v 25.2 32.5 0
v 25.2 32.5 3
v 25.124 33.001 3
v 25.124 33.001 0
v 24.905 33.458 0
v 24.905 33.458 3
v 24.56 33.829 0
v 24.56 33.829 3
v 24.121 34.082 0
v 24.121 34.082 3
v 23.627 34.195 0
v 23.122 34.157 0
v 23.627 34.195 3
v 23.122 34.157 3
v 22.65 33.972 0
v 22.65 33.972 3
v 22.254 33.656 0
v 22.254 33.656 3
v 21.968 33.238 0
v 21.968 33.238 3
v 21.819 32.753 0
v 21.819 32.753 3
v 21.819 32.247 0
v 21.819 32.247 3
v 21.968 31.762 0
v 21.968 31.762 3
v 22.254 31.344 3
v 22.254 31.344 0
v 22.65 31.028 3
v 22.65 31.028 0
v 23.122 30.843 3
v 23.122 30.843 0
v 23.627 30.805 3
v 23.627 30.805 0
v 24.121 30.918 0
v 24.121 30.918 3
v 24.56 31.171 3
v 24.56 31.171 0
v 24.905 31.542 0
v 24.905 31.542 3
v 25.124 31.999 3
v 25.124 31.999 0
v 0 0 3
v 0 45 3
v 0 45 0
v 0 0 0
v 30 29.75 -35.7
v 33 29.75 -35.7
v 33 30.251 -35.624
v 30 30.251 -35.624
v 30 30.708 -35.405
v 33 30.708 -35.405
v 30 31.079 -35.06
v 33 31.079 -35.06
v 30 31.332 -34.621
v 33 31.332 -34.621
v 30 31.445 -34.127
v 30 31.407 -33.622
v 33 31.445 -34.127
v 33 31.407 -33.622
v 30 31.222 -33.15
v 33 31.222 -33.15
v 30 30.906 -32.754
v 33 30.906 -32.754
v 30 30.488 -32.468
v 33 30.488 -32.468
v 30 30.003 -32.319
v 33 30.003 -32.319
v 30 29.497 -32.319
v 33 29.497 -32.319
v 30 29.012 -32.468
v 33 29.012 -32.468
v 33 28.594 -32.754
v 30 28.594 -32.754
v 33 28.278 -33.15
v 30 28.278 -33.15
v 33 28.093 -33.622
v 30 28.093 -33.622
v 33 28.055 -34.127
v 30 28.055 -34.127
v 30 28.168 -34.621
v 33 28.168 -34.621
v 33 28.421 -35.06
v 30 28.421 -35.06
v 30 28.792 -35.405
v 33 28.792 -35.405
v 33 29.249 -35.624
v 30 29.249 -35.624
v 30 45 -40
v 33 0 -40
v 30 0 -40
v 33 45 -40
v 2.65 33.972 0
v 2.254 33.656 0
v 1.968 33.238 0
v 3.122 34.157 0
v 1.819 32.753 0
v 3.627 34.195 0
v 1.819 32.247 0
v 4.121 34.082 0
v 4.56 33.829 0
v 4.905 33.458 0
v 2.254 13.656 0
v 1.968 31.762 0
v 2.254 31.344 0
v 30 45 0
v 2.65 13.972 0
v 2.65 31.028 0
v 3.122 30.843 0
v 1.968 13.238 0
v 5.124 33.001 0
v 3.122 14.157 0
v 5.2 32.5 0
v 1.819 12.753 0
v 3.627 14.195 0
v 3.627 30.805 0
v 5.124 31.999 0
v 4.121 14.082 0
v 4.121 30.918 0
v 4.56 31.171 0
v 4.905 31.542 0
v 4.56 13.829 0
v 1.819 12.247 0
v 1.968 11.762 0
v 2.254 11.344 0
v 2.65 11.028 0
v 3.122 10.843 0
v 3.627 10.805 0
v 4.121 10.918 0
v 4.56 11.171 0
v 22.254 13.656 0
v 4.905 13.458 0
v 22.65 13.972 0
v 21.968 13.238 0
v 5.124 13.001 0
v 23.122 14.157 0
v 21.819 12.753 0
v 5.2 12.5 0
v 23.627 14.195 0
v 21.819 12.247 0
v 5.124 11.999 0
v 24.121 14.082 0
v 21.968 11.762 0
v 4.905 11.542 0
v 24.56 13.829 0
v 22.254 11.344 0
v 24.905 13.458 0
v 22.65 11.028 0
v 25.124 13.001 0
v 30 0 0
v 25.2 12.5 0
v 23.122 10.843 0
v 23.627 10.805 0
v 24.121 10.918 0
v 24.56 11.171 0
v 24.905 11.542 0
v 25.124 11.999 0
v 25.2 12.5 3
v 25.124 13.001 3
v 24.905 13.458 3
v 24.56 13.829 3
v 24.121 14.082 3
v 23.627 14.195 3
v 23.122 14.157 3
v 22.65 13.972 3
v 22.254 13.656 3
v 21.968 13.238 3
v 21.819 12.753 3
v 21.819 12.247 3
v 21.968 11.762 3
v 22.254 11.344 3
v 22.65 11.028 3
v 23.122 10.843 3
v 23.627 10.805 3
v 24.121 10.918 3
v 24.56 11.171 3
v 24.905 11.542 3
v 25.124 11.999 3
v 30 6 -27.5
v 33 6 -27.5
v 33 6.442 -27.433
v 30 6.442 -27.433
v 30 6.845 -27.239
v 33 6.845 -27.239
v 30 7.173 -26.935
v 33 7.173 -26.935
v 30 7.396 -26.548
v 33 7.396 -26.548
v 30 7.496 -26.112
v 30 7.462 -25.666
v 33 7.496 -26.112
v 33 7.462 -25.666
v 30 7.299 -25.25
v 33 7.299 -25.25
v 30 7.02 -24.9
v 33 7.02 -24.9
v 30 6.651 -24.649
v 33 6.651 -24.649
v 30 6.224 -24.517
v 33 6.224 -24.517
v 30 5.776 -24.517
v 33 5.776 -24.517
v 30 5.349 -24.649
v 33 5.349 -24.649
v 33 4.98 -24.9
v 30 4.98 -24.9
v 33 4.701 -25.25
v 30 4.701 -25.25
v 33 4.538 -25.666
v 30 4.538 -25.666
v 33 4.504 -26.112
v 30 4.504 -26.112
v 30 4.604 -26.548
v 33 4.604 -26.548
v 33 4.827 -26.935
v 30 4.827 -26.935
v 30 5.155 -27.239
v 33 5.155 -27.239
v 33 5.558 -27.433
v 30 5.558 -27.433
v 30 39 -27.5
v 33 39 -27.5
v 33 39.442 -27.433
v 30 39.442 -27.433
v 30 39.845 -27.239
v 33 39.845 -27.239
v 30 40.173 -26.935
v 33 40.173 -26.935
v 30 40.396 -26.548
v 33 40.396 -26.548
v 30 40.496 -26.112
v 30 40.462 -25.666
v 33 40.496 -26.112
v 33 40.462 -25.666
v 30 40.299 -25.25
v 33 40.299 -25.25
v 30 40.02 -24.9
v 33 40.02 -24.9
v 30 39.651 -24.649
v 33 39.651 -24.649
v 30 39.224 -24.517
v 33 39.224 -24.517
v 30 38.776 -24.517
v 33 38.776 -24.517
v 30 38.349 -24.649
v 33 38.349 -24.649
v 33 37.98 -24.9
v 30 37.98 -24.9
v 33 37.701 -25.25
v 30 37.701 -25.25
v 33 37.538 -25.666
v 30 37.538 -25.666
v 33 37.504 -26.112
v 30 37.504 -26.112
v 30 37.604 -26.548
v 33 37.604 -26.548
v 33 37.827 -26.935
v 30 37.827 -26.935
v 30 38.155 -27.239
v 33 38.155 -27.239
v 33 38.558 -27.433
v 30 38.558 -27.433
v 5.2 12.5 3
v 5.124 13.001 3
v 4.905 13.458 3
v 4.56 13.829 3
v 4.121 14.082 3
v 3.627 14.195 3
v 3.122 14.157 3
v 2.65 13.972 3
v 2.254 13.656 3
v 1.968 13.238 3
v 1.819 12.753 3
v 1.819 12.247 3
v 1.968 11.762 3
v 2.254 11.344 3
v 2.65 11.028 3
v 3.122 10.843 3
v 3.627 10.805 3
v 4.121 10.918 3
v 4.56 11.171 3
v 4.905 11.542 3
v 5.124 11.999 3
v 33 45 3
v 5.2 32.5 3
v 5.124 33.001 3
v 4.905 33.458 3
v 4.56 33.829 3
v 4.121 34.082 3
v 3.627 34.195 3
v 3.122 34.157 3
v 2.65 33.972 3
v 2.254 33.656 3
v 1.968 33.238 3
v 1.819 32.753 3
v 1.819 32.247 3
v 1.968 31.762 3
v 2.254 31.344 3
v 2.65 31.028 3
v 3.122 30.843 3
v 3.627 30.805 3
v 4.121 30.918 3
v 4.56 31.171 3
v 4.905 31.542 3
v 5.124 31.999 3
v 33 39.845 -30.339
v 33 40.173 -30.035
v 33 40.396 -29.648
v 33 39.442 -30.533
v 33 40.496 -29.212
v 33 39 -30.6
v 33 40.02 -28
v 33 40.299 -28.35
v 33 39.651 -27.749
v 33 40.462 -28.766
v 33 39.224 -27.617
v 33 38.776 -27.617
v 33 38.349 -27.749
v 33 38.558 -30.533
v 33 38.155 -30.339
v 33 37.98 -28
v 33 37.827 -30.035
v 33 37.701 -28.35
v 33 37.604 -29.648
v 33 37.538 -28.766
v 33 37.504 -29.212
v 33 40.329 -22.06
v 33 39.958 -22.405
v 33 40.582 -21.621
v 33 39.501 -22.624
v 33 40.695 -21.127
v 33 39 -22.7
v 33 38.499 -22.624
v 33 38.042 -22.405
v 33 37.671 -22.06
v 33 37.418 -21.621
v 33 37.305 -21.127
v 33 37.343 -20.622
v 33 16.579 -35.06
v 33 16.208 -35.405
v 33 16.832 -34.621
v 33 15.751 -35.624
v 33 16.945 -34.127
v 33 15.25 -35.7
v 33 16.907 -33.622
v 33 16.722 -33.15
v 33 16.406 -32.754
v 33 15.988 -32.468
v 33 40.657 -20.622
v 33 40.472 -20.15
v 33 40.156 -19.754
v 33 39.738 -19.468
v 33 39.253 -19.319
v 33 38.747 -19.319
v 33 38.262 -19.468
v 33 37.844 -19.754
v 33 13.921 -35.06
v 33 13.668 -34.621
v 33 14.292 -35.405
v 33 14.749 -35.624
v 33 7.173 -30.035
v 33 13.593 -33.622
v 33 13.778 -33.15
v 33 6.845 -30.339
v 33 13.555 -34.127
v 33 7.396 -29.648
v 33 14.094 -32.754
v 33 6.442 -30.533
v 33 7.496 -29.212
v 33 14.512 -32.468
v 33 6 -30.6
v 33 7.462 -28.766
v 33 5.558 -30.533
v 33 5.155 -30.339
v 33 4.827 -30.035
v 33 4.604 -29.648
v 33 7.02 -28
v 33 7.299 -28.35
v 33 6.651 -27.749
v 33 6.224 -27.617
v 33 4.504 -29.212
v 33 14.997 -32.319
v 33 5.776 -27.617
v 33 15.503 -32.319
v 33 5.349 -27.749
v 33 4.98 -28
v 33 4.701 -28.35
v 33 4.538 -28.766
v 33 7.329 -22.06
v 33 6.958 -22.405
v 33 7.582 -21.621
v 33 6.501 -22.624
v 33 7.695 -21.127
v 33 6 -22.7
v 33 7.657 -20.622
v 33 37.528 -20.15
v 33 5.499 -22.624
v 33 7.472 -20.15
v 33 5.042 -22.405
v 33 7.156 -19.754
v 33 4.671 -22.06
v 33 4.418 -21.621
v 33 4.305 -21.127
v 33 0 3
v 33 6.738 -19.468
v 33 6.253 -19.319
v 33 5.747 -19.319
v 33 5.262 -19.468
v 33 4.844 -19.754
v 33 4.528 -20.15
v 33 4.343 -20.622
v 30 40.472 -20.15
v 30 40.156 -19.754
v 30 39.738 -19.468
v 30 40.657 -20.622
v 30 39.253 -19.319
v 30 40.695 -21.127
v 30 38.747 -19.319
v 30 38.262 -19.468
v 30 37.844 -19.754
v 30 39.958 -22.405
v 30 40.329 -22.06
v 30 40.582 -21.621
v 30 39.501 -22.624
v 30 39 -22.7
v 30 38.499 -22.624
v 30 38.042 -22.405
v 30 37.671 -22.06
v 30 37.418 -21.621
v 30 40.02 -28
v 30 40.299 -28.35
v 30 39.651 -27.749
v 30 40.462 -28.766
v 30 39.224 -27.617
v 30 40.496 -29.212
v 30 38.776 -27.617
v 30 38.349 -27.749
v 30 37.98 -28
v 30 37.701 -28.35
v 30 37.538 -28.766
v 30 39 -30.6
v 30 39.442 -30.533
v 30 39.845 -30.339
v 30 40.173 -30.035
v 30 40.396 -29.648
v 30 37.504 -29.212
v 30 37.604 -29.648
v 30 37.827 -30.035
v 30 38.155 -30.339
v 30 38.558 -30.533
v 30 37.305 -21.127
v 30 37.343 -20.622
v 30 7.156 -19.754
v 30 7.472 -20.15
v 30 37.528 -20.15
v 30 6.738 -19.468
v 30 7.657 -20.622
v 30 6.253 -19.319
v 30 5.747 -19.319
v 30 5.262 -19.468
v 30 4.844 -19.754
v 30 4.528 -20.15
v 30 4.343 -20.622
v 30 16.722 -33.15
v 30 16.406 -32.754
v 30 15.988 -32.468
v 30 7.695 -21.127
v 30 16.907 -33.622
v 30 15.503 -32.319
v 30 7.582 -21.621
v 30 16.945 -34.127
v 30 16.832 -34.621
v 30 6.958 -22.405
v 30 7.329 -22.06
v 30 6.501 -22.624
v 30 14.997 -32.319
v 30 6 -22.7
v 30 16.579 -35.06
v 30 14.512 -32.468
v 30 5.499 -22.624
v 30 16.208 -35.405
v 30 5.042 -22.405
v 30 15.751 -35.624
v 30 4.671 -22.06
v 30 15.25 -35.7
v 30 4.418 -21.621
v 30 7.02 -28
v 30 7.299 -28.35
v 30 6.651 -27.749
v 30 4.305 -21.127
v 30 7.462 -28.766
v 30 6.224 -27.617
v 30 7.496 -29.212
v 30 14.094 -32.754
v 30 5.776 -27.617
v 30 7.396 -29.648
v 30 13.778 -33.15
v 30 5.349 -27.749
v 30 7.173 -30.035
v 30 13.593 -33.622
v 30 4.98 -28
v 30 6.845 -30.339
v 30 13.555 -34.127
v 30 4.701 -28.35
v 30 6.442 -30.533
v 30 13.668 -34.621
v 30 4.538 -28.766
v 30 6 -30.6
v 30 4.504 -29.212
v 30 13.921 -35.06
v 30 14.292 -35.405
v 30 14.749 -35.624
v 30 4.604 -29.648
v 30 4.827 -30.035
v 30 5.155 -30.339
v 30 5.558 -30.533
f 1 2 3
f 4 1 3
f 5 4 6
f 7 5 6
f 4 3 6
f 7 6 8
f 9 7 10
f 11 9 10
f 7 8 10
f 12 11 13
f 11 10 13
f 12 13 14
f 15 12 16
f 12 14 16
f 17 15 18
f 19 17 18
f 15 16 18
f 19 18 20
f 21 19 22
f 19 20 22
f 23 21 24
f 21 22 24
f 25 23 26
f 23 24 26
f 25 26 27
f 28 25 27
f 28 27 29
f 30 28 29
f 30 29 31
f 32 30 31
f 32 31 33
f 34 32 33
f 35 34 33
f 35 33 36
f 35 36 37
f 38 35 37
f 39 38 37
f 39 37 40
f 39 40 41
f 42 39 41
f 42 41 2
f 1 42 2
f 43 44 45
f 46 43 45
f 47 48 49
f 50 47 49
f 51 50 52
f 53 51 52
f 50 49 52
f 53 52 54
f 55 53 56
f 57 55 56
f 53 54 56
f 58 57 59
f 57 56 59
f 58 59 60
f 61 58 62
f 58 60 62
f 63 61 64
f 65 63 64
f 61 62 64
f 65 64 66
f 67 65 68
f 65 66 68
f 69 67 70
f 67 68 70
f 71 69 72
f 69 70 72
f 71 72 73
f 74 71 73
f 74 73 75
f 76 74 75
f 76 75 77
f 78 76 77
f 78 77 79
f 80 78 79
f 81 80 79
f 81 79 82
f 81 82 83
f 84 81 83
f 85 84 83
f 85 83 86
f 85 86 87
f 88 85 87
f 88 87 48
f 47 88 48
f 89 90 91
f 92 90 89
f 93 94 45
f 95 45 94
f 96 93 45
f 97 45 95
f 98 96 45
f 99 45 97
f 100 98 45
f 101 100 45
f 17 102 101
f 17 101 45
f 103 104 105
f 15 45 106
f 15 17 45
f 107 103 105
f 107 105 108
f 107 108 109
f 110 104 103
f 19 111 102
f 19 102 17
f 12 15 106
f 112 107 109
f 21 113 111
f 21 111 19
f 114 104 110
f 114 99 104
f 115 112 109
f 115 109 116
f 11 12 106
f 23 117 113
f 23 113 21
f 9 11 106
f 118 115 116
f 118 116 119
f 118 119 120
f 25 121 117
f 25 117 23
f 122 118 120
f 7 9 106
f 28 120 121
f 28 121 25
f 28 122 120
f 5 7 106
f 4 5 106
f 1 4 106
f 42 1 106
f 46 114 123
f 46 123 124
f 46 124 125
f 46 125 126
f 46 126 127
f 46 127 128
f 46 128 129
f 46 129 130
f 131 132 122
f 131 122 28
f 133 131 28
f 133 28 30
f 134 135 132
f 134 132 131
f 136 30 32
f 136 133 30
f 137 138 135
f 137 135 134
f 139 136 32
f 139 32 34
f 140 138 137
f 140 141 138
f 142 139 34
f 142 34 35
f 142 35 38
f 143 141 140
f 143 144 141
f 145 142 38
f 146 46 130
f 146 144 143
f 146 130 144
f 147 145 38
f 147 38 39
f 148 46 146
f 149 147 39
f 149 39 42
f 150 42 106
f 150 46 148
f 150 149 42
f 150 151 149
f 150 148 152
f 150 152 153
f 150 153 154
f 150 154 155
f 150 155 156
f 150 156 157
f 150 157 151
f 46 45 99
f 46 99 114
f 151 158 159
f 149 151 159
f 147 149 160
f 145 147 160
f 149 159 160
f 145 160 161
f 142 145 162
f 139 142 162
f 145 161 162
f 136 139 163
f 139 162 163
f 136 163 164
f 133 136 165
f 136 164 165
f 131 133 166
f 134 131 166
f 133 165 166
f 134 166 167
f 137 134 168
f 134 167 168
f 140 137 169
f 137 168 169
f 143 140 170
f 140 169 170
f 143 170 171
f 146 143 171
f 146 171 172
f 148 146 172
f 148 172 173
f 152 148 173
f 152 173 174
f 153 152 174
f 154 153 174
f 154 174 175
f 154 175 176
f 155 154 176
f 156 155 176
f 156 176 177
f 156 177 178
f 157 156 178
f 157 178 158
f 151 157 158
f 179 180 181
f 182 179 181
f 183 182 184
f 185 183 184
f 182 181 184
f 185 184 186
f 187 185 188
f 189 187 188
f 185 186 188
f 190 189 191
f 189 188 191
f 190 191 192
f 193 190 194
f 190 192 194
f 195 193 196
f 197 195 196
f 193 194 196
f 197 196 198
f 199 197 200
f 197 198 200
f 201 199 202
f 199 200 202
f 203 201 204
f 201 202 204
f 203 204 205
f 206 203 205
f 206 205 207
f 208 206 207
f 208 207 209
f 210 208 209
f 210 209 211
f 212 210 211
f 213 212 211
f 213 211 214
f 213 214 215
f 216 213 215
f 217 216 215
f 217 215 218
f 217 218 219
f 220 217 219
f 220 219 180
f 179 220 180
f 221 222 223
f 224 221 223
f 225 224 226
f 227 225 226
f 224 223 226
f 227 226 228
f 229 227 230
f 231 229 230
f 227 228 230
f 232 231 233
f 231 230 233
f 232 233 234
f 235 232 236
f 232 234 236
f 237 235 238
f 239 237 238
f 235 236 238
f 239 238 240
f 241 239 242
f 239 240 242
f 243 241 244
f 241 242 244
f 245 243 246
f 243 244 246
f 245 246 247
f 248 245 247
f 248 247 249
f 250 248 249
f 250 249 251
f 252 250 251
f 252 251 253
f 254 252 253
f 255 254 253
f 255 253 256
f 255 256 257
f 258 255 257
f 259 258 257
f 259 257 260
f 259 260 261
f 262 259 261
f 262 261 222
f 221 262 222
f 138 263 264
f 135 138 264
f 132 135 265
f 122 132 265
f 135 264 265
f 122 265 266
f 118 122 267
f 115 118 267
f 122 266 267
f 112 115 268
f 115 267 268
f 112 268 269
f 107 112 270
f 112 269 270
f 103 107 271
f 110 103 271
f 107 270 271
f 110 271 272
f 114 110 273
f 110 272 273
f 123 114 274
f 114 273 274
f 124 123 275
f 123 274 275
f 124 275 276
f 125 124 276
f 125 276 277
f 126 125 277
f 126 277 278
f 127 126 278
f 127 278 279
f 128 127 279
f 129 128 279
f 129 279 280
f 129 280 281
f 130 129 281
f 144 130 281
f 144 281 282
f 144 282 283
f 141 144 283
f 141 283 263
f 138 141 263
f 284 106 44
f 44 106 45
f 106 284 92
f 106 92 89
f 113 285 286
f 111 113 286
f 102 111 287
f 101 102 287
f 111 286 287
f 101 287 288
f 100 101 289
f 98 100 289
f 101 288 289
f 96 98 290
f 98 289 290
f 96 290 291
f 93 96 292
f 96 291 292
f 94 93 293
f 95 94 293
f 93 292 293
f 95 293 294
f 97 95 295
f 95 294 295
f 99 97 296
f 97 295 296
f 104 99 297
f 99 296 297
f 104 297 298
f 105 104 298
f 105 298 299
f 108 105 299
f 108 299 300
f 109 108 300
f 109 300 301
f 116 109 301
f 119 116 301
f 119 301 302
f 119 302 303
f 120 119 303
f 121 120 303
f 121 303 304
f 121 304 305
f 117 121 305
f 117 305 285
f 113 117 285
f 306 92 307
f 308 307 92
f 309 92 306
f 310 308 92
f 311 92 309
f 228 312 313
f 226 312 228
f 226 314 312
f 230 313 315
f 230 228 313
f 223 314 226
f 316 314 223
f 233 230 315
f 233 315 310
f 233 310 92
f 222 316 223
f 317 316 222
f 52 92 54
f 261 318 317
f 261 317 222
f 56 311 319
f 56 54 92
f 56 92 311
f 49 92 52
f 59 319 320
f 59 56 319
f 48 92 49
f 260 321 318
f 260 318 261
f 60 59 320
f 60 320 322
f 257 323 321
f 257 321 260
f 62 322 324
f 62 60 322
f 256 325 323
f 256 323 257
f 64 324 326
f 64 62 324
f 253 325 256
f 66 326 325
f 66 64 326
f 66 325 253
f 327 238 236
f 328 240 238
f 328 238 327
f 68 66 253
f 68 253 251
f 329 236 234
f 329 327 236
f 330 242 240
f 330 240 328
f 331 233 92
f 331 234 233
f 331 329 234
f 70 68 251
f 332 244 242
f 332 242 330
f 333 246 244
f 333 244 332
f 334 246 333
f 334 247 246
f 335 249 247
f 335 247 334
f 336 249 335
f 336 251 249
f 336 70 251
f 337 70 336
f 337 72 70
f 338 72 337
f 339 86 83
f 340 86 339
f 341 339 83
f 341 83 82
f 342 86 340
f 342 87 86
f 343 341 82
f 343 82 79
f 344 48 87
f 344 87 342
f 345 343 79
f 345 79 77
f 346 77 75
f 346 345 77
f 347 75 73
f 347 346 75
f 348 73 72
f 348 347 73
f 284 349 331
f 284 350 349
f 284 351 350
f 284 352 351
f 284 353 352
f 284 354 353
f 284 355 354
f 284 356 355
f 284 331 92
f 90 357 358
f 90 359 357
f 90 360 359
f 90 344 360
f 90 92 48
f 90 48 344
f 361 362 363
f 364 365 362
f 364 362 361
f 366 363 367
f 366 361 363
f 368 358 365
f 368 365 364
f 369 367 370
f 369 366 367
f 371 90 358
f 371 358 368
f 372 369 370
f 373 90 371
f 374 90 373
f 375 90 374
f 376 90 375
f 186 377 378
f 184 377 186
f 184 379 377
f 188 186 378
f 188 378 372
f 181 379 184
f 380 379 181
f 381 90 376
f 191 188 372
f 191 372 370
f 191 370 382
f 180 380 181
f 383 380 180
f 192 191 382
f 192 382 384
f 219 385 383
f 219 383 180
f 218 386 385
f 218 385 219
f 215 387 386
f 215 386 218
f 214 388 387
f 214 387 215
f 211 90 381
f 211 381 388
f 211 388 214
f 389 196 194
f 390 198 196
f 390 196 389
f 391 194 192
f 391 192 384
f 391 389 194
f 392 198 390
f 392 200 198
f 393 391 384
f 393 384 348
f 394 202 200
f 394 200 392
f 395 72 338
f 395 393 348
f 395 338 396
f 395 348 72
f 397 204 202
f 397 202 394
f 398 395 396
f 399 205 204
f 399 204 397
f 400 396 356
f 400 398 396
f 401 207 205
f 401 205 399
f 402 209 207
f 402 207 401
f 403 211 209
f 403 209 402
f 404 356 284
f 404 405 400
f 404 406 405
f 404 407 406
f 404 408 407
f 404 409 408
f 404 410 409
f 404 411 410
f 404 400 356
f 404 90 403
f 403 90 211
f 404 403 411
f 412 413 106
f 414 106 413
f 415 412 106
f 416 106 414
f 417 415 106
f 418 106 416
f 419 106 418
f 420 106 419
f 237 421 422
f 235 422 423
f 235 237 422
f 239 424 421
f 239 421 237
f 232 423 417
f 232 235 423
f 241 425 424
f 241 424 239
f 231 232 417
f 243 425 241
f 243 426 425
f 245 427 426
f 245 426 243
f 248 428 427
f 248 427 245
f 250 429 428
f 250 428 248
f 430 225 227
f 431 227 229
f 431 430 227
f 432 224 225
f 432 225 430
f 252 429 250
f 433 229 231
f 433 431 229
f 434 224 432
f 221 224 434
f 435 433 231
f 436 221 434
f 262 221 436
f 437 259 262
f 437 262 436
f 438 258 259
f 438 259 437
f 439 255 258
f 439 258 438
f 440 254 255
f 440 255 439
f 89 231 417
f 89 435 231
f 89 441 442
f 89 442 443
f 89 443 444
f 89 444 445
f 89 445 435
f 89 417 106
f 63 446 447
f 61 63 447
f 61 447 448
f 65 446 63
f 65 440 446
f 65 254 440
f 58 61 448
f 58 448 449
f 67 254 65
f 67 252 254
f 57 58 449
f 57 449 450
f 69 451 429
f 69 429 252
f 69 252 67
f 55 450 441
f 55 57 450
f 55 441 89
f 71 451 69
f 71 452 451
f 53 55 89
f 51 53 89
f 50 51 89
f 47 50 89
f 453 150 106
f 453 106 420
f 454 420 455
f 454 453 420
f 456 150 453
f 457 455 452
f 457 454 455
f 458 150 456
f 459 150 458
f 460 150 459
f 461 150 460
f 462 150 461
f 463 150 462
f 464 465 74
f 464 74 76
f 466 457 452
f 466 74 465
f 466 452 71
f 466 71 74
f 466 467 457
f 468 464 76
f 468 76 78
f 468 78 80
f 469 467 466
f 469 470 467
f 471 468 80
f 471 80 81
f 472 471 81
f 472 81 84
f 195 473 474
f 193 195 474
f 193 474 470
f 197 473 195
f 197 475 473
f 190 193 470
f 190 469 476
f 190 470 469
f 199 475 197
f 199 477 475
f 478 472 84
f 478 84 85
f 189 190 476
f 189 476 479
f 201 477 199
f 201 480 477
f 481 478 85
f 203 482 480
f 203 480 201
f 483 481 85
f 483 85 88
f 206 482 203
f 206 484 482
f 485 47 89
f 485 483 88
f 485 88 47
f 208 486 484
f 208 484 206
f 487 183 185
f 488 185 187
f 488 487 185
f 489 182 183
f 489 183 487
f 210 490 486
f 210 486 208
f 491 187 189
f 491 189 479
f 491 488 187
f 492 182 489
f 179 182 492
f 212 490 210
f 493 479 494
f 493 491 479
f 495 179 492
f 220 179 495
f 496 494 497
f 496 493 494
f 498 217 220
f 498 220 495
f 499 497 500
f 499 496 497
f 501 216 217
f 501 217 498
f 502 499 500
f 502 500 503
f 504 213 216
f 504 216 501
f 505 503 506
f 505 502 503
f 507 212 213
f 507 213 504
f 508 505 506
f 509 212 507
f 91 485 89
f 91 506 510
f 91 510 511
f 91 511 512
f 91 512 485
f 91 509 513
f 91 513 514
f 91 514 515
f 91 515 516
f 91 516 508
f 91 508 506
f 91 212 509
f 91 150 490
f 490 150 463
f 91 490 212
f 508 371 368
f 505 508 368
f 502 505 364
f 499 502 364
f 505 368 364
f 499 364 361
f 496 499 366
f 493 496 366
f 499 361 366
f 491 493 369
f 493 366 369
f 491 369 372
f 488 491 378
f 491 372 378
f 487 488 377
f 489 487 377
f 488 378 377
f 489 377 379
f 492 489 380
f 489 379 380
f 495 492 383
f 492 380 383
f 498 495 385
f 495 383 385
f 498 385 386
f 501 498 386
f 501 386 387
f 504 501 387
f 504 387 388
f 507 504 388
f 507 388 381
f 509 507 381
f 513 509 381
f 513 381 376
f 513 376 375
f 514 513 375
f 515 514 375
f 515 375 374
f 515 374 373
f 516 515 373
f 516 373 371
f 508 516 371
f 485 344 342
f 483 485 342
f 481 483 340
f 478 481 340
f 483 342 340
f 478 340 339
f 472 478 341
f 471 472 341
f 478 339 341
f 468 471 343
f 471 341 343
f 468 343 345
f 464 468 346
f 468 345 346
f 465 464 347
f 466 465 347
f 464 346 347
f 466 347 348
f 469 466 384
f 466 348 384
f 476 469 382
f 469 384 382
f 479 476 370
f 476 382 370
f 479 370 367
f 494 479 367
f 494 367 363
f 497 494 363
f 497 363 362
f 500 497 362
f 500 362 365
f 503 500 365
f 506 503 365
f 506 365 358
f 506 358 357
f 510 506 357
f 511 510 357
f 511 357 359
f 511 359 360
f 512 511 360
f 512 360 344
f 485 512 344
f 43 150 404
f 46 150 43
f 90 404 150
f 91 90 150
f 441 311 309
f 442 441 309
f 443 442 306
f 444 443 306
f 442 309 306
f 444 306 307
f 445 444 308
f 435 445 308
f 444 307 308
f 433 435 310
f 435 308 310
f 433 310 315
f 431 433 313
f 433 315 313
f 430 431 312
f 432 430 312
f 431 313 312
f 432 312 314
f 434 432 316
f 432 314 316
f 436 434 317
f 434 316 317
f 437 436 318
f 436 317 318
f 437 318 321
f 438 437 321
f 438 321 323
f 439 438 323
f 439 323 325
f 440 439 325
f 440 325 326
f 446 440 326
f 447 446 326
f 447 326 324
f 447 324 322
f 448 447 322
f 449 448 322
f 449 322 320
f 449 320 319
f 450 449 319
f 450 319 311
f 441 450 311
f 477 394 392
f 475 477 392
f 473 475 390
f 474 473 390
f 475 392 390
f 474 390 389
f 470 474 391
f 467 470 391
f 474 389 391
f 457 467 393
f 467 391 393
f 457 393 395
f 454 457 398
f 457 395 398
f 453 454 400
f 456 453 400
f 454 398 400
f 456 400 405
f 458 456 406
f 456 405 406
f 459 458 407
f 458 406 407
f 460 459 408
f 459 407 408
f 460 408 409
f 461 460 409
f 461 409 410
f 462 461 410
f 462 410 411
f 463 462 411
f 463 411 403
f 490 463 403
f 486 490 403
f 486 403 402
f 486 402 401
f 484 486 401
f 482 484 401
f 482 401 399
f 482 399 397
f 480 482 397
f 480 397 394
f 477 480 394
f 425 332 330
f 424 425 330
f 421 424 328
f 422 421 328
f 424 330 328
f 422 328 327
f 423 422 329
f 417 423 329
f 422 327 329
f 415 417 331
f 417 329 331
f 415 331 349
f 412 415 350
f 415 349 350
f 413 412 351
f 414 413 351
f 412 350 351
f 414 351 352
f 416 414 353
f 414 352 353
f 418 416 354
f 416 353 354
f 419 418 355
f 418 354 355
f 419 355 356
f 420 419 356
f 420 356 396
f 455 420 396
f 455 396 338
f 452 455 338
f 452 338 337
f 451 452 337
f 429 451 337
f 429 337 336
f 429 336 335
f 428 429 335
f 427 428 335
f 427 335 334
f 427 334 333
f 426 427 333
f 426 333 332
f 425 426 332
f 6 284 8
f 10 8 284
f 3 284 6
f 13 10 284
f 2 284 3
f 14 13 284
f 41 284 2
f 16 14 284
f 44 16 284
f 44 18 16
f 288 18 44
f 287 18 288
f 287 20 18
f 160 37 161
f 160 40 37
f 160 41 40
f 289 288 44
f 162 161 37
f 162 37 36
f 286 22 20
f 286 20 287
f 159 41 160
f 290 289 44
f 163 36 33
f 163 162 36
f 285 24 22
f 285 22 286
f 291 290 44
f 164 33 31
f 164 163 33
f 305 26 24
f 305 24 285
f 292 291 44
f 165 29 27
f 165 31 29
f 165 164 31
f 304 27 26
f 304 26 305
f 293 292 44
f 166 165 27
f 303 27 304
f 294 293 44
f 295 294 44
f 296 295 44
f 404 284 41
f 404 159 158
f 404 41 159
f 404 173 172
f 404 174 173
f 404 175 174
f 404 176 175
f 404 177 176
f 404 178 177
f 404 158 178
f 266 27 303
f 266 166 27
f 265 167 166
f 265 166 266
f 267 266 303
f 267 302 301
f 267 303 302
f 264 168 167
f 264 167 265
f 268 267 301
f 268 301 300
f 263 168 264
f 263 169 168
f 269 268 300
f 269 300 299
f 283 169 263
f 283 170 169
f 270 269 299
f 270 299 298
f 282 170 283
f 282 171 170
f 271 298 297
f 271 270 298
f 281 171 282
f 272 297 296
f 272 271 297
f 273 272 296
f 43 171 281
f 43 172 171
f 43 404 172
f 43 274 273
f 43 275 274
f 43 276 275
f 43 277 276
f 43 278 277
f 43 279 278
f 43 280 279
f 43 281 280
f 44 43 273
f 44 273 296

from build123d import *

# Parameters (mm, degrees)
EXTRUDE_1_DEPTH          = 45
CUT_EXTRUDE_1_REACH      = 86.161
SKETCH_2_R               = 1.7
CUT_EXTRUDE_2_REACH      = 83.939
SKETCH_3_R               = 1.7
SKETCH_3_R_2             = 1.5
CUT_EXTRUDE_3_DEPTH      = 81.777472107
CUT_EXTRUDE_3_DEPTH_BACK = 81.777472107


with BuildPart() as part:
    # 草图1 → 凸台-拉伸1 (new body)
    with BuildSketch(Plane(origin=(0, 0, 0), x_dir=(1, 0, 0), z_dir=(0, 1, 0))):
        Polygon((0, 0), (30, 0), (30, 60), (33, 60), (33, -3), (0, -3), align=None)
    extrude(amount=EXTRUDE_1_DEPTH)

    # 草图2 → 切除-拉伸1 (cut, up to next)
    with BuildSketch(Plane.XY.offset(3), mode=Mode.PRIVATE) as cut_extrude_1_sk1:
        with Locations((3.5, 32.5)):
            Circle(SKETCH_2_R)
    cut_extrude_1_tool1 = extrude(cut_extrude_1_sk1.sketch, amount=-CUT_EXTRUDE_1_REACH, mode=Mode.PRIVATE) & part.part
    # 草图2 → 切除-拉伸1 (cut, up to next)
    with BuildSketch(Plane.XY.offset(3), mode=Mode.PRIVATE) as cut_extrude_1_sk2:
        with Locations((23.5, 32.5)):
            Circle(SKETCH_2_R)
    cut_extrude_1_tool2 = extrude(cut_extrude_1_sk2.sketch, amount=-CUT_EXTRUDE_1_REACH, mode=Mode.PRIVATE) & part.part
    # 草图2 → 切除-拉伸1 (cut, up to next)
    with BuildSketch(Plane.XY.offset(3), mode=Mode.PRIVATE) as cut_extrude_1_sk3:
        with Locations((23.5, 12.5)):
            Circle(SKETCH_2_R)
    cut_extrude_1_tool3 = extrude(cut_extrude_1_sk3.sketch, amount=-CUT_EXTRUDE_1_REACH, mode=Mode.PRIVATE) & part.part
    # 草图2 → 切除-拉伸1 (cut, up to next)
    with BuildSketch(Plane.XY.offset(3), mode=Mode.PRIVATE) as cut_extrude_1_sk4:
        with Locations((3.5, 12.5)):
            Circle(SKETCH_2_R)
    cut_extrude_1_tool4 = extrude(cut_extrude_1_sk4.sketch, amount=-CUT_EXTRUDE_1_REACH, mode=Mode.PRIVATE) & part.part
    add(cut_extrude_1_tool1.solids().sort_by_distance((3.5, 32.5, 3))[0], mode=Mode.SUBTRACT)
    add(cut_extrude_1_tool2.solids().sort_by_distance((23.5, 32.5, 3))[0], mode=Mode.SUBTRACT)
    add(cut_extrude_1_tool3.solids().sort_by_distance((23.5, 12.5, 3))[0], mode=Mode.SUBTRACT)
    add(cut_extrude_1_tool4.solids().sort_by_distance((3.5, 12.5, 3))[0], mode=Mode.SUBTRACT)

    # 草图3 → 切除-拉伸2 (cut, up to next)
    with BuildSketch(Plane(origin=(33, 0, 0), x_dir=(0, 0, -1), z_dir=(1, 0, 0)), mode=Mode.PRIVATE) as cut_extrude_2_sk1:
        with Locations((21, 6)):
            Circle(SKETCH_3_R)
    cut_extrude_2_tool1 = extrude(cut_extrude_2_sk1.sketch, amount=-CUT_EXTRUDE_2_REACH, mode=Mode.PRIVATE) & part.part
    # 草图3 → 切除-拉伸2 (cut, up to next)
    with BuildSketch(Plane(origin=(33, 0, 0), x_dir=(0, 0, -1), z_dir=(1, 0, 0)), mode=Mode.PRIVATE) as cut_extrude_2_sk2:
        with Locations((21, 39)):
            Circle(SKETCH_3_R)
    cut_extrude_2_tool2 = extrude(cut_extrude_2_sk2.sketch, amount=-CUT_EXTRUDE_2_REACH, mode=Mode.PRIVATE) & part.part
    # 草图3 → 切除-拉伸2 (cut, up to next)
    with BuildSketch(Plane(origin=(33, 0, 0), x_dir=(0, 0, -1), z_dir=(1, 0, 0)), mode=Mode.PRIVATE) as cut_extrude_2_sk3:
        with Locations((34, 15.25)):
            Circle(SKETCH_3_R)
    cut_extrude_2_tool3 = extrude(cut_extrude_2_sk3.sketch, amount=-CUT_EXTRUDE_2_REACH, mode=Mode.PRIVATE) & part.part
    # 草图3 → 切除-拉伸2 (cut, up to next)
    with BuildSketch(Plane(origin=(33, 0, 0), x_dir=(0, 0, -1), z_dir=(1, 0, 0)), mode=Mode.PRIVATE) as cut_extrude_2_sk4:
        with Locations((34, 29.75)):
            Circle(SKETCH_3_R)
    cut_extrude_2_tool4 = extrude(cut_extrude_2_sk4.sketch, amount=-CUT_EXTRUDE_2_REACH, mode=Mode.PRIVATE) & part.part
    # 草图3 → 切除-拉伸2 (cut, up to next)
    with BuildSketch(Plane(origin=(33, 0, 0), x_dir=(0, 0, -1), z_dir=(1, 0, 0)), mode=Mode.PRIVATE) as cut_extrude_2_sk5:
        with Locations((26, 39)):
            Circle(SKETCH_3_R_2)
    cut_extrude_2_tool5 = extrude(cut_extrude_2_sk5.sketch, amount=-CUT_EXTRUDE_2_REACH, mode=Mode.PRIVATE) & part.part
    # 草图3 → 切除-拉伸2 (cut, up to next)
    with BuildSketch(Plane(origin=(33, 0, 0), x_dir=(0, 0, -1), z_dir=(1, 0, 0)), mode=Mode.PRIVATE) as cut_extrude_2_sk6:
        with Locations((29.1, 6)):
            Circle(SKETCH_3_R_2)
    cut_extrude_2_tool6 = extrude(cut_extrude_2_sk6.sketch, amount=-CUT_EXTRUDE_2_REACH, mode=Mode.PRIVATE) & part.part
    # 草图3 → 切除-拉伸2 (cut, up to next)
    with BuildSketch(Plane(origin=(33, 0, 0), x_dir=(0, 0, -1), z_dir=(1, 0, 0)), mode=Mode.PRIVATE) as cut_extrude_2_sk7:
        with Locations((29.1, 39)):
            Circle(SKETCH_3_R_2)
    cut_extrude_2_tool7 = extrude(cut_extrude_2_sk7.sketch, amount=-CUT_EXTRUDE_2_REACH, mode=Mode.PRIVATE) & part.part
    # 草图3 → 切除-拉伸2 (cut, up to next)
    with BuildSketch(Plane(origin=(33, 0, 0), x_dir=(0, 0, -1), z_dir=(1, 0, 0)), mode=Mode.PRIVATE) as cut_extrude_2_sk8:
        with Locations((26, 6)):
            Circle(SKETCH_3_R_2)
    cut_extrude_2_tool8 = extrude(cut_extrude_2_sk8.sketch, amount=-CUT_EXTRUDE_2_REACH, mode=Mode.PRIVATE) & part.part
    add(cut_extrude_2_tool1.solids().sort_by_distance((33, 6, -21))[0], mode=Mode.SUBTRACT)
    add(cut_extrude_2_tool2.solids().sort_by_distance((33, 39, -21))[0], mode=Mode.SUBTRACT)
    add(cut_extrude_2_tool3.solids().sort_by_distance((33, 15.25, -34))[0], mode=Mode.SUBTRACT)
    add(cut_extrude_2_tool4.solids().sort_by_distance((33, 29.75, -34))[0], mode=Mode.SUBTRACT)
    add(cut_extrude_2_tool5.solids().sort_by_distance((33, 39, -26))[0], mode=Mode.SUBTRACT)
    add(cut_extrude_2_tool6.solids().sort_by_distance((33, 6, -29.1))[0], mode=Mode.SUBTRACT)
    add(cut_extrude_2_tool7.solids().sort_by_distance((33, 39, -29.1))[0], mode=Mode.SUBTRACT)
    add(cut_extrude_2_tool8.solids().sort_by_distance((33, 6, -26))[0], mode=Mode.SUBTRACT)

    # 草图4 → 切除-拉伸3 (cut, two sides: drawn at the far end of the back side and taken through both)
    with BuildSketch(Plane.ZY.offset(-30).offset(-CUT_EXTRUDE_3_DEPTH_BACK)):
        Polygon((-40, 179.482930557), (-40, 45), (-40, 0), (-40, -134.482930557), (-308.965861114, -134.482930557), (-308.965861114, 179.482930557), align=None)
    extrude(amount=CUT_EXTRUDE_3_DEPTH + CUT_EXTRUDE_3_DEPTH_BACK, mode=Mode.SUBTRACT)


solid = part.part
